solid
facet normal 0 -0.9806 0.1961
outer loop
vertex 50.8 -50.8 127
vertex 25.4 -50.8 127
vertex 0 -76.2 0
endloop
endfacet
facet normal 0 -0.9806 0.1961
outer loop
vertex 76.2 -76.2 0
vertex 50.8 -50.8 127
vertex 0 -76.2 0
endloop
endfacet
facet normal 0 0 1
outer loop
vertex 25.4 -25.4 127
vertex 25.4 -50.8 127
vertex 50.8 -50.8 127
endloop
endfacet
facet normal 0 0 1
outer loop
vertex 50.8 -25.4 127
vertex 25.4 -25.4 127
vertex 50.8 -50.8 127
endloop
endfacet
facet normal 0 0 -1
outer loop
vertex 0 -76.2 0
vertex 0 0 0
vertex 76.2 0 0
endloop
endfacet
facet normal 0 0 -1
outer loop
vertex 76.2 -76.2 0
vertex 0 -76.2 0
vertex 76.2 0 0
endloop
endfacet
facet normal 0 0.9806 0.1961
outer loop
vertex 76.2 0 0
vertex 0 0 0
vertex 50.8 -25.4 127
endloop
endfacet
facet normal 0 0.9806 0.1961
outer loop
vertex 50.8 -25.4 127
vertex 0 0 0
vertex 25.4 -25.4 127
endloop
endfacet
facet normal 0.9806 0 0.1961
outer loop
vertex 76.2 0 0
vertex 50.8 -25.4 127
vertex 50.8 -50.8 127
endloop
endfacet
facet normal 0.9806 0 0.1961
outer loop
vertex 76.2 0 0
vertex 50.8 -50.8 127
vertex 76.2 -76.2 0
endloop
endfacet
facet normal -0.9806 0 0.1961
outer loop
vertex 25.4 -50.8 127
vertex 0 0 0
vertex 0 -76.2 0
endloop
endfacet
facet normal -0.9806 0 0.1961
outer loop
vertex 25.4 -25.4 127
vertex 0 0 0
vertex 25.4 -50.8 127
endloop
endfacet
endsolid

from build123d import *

# Parameters (mm, degrees)
F0_W     = 76.2
F0_H     = 127
F1_DEPTH = 76.2
F3_DEPTH = 76.2
F5_DEPTH = 76.2


with BuildPart() as f1:
    # F0 (on Front) → F1 (new body)
    with BuildSketch(Plane.XZ):
        with Locations((38.1, 63.5)):
            Rectangle(F0_W, F0_H)
    extrude(amount=F1_DEPTH)

    # F2 (on face) → F3 (cut)
    with BuildSketch(Plane(origin=(0, 0, 0), x_dir=(0, -1, 0), z_dir=(-1, 0, 0))):
        Polygon((0, 127), (0, 0), (25.4, 127), align=None)
        Polygon((50.8, 127), (76.2, 0), (76.2, 127), align=None)
    extrude(amount=-F3_DEPTH, mode=Mode.SUBTRACT)

    # F4 (on Front) → F5 (cut)
    with BuildSketch(Plane.XZ):
        Polygon((0, 127), (0, 0), (25.4, 127), align=None)
        Polygon((50.8, 127), (76.2, 0), (76.2, 127), align=None)
    extrude(amount=F5_DEPTH, mode=Mode.SUBTRACT)


solid = f1.part
